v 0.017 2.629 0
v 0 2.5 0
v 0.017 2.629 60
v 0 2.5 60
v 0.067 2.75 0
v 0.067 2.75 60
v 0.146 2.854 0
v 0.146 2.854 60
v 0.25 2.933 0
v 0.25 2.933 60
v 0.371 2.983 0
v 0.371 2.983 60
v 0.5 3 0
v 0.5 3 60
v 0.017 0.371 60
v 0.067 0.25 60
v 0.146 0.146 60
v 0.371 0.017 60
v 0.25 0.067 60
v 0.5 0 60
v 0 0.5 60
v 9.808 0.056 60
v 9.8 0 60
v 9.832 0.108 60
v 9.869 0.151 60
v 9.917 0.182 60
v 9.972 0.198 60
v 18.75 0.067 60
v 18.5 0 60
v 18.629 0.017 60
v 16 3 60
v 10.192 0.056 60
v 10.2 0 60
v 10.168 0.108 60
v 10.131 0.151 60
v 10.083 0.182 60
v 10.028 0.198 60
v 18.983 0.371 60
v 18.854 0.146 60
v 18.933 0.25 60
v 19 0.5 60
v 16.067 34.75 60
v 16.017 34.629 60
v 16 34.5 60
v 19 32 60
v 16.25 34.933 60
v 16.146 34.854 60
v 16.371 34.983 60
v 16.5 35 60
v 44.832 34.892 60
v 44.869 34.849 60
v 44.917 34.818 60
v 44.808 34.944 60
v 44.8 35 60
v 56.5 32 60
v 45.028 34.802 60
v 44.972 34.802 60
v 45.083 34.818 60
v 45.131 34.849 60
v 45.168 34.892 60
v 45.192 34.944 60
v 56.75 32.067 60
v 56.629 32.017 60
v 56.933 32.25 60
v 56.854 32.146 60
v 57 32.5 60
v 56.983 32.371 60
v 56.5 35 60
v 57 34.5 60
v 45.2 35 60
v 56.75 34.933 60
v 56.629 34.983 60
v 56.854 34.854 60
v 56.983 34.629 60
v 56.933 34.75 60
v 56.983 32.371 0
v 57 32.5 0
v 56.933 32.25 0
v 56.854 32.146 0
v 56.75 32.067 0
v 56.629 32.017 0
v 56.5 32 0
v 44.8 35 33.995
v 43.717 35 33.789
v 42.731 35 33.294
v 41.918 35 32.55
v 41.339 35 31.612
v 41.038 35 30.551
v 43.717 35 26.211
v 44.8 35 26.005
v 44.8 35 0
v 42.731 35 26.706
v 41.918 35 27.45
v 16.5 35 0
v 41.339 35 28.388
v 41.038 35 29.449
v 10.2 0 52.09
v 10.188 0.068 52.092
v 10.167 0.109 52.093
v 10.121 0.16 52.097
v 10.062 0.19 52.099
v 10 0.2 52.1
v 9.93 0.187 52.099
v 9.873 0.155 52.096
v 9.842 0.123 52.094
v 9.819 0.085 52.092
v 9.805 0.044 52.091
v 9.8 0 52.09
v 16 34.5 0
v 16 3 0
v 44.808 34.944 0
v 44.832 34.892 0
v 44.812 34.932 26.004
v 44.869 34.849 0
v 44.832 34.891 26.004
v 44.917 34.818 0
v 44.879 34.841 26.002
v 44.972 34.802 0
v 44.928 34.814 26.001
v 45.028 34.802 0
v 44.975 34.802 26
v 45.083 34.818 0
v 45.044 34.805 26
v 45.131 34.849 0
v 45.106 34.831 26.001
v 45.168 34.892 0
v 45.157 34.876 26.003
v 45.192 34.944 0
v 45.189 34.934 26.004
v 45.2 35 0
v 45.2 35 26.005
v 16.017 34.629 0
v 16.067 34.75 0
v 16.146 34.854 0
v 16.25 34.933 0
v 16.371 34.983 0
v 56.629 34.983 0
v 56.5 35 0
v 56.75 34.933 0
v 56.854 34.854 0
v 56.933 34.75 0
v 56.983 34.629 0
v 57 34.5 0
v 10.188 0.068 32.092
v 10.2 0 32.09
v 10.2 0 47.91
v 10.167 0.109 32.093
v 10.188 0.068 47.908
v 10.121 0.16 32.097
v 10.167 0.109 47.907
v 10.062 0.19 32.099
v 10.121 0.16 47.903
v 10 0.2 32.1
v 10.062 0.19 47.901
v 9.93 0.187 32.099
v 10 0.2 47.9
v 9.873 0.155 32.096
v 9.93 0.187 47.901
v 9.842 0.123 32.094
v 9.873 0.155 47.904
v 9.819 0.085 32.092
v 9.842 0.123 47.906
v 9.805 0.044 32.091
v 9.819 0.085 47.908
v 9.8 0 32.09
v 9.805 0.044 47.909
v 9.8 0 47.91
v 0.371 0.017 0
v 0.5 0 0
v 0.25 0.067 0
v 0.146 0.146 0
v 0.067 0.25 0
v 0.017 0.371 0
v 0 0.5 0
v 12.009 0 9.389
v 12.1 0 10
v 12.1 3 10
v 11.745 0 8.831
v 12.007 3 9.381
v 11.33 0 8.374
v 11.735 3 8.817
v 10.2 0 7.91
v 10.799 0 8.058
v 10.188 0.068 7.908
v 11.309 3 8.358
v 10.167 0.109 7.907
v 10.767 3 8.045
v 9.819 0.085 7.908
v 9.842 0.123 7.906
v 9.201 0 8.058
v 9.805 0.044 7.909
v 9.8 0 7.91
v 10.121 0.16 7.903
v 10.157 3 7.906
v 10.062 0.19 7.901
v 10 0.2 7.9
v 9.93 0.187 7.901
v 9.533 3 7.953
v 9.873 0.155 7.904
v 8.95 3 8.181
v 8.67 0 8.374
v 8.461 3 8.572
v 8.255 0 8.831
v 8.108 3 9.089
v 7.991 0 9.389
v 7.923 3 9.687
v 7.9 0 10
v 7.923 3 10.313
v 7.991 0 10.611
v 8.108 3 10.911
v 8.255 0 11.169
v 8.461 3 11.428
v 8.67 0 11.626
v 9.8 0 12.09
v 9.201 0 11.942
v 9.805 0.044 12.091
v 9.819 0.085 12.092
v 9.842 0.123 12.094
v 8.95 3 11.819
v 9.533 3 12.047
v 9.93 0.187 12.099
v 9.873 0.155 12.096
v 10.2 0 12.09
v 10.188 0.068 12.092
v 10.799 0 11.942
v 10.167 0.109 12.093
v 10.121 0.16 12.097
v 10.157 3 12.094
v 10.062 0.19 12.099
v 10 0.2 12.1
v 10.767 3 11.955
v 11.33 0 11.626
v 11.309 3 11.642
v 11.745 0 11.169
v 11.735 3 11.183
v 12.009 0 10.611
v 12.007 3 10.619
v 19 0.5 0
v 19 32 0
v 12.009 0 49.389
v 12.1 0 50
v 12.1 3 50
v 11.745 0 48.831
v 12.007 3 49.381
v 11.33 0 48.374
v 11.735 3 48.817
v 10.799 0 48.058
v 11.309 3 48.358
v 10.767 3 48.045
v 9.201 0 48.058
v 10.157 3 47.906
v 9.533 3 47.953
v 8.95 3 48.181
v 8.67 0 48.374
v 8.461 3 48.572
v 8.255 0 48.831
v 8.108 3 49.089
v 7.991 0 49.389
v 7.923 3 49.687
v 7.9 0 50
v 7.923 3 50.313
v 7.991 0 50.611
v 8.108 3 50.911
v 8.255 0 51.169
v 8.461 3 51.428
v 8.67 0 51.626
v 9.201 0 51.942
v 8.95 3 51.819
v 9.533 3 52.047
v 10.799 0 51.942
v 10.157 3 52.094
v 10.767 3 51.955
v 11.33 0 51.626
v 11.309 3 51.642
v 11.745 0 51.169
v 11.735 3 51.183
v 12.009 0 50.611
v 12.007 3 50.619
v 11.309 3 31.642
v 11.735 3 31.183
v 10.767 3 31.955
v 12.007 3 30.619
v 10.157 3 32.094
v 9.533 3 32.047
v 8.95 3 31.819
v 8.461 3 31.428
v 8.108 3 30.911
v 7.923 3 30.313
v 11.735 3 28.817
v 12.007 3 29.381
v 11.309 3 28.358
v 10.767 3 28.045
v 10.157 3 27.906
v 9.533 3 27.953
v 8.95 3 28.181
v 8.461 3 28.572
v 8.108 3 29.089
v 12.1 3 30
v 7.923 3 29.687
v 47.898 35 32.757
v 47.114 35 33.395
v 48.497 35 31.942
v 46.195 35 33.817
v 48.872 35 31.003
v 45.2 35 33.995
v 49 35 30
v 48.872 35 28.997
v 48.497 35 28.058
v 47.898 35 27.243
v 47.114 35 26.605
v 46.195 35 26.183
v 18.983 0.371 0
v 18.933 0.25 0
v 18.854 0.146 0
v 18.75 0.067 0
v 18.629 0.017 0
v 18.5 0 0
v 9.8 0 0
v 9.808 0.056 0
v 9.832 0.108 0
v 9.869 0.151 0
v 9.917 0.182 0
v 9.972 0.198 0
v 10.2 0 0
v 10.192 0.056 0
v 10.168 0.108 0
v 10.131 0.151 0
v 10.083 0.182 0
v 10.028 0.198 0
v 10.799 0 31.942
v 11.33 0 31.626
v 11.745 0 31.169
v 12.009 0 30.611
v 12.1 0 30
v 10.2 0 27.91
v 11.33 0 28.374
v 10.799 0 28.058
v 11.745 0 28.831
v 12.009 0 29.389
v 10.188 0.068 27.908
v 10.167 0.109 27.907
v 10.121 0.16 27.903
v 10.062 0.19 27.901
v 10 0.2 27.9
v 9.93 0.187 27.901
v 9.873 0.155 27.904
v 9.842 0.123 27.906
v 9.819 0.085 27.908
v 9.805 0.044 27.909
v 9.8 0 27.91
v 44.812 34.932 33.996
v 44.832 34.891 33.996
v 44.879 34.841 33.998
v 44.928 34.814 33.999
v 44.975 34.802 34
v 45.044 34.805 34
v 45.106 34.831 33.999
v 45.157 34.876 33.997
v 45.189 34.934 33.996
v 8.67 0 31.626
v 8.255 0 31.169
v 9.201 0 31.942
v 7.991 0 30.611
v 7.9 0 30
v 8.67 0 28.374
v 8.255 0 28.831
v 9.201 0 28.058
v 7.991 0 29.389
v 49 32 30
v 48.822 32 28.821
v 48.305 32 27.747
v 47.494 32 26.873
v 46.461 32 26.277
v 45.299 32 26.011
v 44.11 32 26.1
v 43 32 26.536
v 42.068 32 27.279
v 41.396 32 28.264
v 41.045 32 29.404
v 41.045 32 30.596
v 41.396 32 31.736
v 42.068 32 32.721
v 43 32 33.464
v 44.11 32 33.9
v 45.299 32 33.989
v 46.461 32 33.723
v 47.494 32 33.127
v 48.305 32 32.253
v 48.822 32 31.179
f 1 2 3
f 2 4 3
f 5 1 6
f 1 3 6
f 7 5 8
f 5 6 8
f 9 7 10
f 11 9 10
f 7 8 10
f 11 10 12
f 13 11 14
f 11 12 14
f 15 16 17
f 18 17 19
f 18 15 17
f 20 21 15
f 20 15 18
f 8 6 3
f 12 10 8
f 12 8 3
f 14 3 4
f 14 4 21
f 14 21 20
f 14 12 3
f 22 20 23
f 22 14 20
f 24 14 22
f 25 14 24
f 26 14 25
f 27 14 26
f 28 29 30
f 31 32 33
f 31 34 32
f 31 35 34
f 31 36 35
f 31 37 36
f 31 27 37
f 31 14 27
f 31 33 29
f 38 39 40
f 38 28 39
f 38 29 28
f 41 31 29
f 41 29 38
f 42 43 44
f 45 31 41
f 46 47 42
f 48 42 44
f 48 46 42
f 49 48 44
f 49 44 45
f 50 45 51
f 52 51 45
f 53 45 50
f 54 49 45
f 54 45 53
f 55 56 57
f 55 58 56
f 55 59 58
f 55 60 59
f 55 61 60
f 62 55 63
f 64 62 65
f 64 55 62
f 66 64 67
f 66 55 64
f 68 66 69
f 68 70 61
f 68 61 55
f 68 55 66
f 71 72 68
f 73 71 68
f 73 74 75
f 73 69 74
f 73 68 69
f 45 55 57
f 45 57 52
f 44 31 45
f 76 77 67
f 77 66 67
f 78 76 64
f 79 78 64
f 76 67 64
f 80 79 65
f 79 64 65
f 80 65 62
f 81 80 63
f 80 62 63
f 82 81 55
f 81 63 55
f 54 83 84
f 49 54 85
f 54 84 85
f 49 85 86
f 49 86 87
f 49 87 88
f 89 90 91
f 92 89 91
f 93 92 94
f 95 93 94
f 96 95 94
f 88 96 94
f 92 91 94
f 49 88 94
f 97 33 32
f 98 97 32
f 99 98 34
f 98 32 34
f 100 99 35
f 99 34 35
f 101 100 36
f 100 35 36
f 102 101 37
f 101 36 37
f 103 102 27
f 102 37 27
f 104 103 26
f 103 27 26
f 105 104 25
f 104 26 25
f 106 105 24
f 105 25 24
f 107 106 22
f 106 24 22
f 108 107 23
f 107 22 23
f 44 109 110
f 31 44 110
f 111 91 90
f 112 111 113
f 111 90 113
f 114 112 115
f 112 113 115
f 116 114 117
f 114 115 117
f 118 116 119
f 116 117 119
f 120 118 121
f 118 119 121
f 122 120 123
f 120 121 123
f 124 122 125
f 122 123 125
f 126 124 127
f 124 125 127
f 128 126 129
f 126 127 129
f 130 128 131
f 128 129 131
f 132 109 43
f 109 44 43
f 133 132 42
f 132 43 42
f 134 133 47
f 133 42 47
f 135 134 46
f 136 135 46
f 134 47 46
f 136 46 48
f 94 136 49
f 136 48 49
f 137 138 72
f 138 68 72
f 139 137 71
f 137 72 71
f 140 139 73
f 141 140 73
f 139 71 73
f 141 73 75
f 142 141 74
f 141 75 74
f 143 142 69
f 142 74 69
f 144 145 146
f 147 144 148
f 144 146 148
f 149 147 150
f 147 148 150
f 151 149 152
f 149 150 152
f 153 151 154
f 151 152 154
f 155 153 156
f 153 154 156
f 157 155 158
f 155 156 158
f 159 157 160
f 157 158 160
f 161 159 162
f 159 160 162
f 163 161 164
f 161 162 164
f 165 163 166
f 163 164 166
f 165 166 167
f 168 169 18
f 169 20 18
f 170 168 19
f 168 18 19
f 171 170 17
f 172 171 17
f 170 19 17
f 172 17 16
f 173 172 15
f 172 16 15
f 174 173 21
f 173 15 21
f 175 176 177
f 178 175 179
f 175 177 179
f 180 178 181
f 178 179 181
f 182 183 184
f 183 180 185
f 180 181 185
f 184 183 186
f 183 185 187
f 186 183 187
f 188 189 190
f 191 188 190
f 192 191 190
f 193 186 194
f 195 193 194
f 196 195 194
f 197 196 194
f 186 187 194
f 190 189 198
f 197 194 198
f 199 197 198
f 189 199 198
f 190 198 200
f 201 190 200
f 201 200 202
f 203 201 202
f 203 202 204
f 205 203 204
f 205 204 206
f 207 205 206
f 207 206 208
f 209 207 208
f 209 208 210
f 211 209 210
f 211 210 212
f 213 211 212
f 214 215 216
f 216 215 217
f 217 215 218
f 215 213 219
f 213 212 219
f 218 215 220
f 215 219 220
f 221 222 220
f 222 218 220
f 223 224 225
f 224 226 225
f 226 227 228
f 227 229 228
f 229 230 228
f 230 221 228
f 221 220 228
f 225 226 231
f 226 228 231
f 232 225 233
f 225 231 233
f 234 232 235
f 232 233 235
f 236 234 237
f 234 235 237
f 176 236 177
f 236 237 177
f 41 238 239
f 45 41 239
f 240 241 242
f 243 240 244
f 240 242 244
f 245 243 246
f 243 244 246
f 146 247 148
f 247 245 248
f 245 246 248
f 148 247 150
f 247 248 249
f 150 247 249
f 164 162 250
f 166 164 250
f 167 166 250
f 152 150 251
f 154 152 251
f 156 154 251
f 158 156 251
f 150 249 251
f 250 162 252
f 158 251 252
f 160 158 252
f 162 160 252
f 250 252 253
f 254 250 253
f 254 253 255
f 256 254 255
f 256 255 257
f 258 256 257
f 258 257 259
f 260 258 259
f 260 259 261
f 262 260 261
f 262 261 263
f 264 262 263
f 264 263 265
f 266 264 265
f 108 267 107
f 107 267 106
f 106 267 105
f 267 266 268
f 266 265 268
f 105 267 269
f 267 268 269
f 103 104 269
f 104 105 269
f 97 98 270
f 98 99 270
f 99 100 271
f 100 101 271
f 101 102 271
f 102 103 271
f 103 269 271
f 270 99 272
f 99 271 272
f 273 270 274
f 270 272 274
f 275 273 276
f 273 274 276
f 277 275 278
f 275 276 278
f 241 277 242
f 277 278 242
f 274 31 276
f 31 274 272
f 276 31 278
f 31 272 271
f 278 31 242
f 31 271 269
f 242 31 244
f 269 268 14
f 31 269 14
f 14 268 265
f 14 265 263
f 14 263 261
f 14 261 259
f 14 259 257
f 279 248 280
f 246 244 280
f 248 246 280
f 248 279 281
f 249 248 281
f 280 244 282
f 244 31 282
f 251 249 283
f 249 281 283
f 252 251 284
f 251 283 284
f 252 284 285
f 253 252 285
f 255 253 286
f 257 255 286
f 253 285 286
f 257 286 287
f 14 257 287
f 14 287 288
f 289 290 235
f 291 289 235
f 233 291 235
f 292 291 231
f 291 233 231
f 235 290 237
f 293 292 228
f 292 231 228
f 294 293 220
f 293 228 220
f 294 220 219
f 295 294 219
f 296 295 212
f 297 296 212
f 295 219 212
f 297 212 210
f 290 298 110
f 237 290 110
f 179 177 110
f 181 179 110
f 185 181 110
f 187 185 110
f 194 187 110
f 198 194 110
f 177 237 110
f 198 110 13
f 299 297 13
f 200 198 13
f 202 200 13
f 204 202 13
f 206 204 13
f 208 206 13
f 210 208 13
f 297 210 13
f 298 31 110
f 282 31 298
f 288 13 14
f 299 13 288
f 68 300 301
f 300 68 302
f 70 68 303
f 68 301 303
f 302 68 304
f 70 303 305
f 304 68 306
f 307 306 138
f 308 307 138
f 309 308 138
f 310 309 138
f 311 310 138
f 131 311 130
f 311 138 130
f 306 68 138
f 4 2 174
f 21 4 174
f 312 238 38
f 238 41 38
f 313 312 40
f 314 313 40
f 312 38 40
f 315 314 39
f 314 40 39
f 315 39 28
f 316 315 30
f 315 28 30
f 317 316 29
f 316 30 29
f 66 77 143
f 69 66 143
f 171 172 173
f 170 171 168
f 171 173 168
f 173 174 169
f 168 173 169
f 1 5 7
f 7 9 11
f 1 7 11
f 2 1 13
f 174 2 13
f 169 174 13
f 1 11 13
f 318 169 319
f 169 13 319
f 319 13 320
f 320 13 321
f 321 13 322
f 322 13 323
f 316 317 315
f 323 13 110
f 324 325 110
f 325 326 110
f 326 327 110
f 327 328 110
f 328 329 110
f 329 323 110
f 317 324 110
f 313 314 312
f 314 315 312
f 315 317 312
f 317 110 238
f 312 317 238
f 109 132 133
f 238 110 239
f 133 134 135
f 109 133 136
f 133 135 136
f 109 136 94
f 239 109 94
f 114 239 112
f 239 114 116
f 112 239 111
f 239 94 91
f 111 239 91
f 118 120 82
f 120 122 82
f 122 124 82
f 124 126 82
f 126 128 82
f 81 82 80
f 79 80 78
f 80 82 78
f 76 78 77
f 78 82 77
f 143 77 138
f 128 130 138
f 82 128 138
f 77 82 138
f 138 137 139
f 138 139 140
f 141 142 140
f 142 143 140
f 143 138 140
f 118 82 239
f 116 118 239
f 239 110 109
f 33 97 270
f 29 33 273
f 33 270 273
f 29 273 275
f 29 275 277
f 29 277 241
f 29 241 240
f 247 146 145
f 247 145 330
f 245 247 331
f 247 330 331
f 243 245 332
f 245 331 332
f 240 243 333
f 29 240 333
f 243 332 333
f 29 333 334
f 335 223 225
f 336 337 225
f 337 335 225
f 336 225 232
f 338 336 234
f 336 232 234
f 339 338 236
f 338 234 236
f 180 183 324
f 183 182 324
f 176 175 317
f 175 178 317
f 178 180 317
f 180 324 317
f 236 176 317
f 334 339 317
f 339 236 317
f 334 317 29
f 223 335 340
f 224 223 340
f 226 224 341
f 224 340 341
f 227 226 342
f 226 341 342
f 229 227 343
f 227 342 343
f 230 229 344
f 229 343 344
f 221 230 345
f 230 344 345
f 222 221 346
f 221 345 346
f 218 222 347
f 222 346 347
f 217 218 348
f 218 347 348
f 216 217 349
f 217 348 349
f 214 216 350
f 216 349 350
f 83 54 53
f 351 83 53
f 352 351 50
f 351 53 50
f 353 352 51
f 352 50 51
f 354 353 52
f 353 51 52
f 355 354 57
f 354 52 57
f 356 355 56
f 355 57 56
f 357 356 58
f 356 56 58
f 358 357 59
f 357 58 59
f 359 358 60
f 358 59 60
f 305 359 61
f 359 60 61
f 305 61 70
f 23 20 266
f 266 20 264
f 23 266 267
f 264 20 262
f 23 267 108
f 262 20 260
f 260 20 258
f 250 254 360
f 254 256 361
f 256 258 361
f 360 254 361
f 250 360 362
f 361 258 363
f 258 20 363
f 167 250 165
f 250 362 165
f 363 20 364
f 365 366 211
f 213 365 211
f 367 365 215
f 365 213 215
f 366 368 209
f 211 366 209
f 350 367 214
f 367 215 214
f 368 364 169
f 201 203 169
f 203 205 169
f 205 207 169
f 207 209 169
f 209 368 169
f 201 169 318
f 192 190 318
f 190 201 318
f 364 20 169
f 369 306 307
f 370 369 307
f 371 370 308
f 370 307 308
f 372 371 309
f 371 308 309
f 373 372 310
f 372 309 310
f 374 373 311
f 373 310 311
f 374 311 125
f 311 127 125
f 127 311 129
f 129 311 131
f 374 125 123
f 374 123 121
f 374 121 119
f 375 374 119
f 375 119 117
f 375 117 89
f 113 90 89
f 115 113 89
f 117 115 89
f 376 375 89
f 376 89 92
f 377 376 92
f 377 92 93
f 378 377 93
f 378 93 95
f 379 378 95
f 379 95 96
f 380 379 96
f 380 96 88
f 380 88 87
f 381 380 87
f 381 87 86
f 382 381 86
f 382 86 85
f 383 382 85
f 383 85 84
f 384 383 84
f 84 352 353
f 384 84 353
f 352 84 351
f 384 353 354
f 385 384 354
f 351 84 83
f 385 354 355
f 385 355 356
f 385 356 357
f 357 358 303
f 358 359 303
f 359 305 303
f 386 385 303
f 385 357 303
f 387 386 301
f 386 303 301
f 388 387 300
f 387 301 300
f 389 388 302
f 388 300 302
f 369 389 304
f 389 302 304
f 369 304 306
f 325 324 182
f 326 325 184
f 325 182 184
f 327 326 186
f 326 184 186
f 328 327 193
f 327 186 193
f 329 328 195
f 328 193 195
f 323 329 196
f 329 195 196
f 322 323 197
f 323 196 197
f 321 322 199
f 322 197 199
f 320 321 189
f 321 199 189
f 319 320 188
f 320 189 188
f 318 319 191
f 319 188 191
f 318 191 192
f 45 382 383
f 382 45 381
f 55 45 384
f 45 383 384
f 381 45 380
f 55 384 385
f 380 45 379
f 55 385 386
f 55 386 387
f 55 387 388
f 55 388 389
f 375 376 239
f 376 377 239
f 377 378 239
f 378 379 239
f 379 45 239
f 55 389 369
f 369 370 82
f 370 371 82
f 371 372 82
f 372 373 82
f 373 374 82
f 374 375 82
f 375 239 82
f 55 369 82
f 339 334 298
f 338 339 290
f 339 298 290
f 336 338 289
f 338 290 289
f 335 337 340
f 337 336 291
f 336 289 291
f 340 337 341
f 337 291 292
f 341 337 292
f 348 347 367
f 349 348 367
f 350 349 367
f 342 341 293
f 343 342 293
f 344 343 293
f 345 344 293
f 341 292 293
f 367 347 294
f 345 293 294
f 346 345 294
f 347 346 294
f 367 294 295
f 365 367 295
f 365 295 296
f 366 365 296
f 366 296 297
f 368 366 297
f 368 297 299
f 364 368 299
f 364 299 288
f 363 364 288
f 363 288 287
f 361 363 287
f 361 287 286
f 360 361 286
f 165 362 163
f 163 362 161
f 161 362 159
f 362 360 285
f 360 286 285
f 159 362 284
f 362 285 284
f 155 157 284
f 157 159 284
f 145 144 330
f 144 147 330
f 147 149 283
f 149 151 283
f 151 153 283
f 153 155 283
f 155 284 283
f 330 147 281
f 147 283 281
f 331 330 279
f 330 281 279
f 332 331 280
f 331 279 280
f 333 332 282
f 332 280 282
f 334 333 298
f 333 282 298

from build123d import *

# Parameters (mm, degrees)
EXTRUDE_1_DEPTH     = 60
SKETCH_2_R          = 4
SKETCH_2_R_2        = 2.1
CUT_EXTRUDE_1_DEPTH = 36
SKETCH_3_R          = 0.2
CUT_EXTRUDE_2_DEPTH = 70
FILLET_1_R          = 0.5


with BuildPart() as part:
    # 草图1 → 凸台-拉伸1 (new body)
    with BuildSketch(Plane.XY):
        Polygon((0, 0), (19, 0), (19, 32), (57, 32), (57, 35), (16, 35), (16, 3), (0, 3), align=None)
    extrude(amount=EXTRUDE_1_DEPTH)

    # 草图2 → 切除-拉伸1 (cut, through all)
    with BuildSketch(Plane(origin=(0, 35, 0), x_dir=(1, 0, 0), z_dir=(0, 1, 0))):
        with Locations((45, -30)):
            Circle(SKETCH_2_R)
        with Locations((10, -30)):
            Circle(SKETCH_2_R_2)
        with Locations((10, -50)):
            Circle(SKETCH_2_R_2)
        with Locations((10, -10)):
            Circle(SKETCH_2_R_2)
    extrude(amount=-CUT_EXTRUDE_1_DEPTH, mode=Mode.SUBTRACT)

    # 草图3 → 切除-拉伸2 (cut)
    with BuildSketch(Plane.XY.offset(60)):
        with Locations((10, 0)):
            Circle(SKETCH_3_R)
        with Locations((45, 35)):
            Circle(SKETCH_3_R)
    extrude(amount=-CUT_EXTRUDE_2_DEPTH, mode=Mode.SUBTRACT)

    # 圆角1
    fillet_1_edges = [part.edges().sort_by_distance(p)[0] for p in [
        (0, 3, 30),
        (16, 35, 30),
        (57, 35, 30),
        (57, 32, 30),
        (19, 0, 30),
        (0, 0, 30),
    ]]
    fillet(fillet_1_edges, radius=FILLET_1_R)


solid = part.part
